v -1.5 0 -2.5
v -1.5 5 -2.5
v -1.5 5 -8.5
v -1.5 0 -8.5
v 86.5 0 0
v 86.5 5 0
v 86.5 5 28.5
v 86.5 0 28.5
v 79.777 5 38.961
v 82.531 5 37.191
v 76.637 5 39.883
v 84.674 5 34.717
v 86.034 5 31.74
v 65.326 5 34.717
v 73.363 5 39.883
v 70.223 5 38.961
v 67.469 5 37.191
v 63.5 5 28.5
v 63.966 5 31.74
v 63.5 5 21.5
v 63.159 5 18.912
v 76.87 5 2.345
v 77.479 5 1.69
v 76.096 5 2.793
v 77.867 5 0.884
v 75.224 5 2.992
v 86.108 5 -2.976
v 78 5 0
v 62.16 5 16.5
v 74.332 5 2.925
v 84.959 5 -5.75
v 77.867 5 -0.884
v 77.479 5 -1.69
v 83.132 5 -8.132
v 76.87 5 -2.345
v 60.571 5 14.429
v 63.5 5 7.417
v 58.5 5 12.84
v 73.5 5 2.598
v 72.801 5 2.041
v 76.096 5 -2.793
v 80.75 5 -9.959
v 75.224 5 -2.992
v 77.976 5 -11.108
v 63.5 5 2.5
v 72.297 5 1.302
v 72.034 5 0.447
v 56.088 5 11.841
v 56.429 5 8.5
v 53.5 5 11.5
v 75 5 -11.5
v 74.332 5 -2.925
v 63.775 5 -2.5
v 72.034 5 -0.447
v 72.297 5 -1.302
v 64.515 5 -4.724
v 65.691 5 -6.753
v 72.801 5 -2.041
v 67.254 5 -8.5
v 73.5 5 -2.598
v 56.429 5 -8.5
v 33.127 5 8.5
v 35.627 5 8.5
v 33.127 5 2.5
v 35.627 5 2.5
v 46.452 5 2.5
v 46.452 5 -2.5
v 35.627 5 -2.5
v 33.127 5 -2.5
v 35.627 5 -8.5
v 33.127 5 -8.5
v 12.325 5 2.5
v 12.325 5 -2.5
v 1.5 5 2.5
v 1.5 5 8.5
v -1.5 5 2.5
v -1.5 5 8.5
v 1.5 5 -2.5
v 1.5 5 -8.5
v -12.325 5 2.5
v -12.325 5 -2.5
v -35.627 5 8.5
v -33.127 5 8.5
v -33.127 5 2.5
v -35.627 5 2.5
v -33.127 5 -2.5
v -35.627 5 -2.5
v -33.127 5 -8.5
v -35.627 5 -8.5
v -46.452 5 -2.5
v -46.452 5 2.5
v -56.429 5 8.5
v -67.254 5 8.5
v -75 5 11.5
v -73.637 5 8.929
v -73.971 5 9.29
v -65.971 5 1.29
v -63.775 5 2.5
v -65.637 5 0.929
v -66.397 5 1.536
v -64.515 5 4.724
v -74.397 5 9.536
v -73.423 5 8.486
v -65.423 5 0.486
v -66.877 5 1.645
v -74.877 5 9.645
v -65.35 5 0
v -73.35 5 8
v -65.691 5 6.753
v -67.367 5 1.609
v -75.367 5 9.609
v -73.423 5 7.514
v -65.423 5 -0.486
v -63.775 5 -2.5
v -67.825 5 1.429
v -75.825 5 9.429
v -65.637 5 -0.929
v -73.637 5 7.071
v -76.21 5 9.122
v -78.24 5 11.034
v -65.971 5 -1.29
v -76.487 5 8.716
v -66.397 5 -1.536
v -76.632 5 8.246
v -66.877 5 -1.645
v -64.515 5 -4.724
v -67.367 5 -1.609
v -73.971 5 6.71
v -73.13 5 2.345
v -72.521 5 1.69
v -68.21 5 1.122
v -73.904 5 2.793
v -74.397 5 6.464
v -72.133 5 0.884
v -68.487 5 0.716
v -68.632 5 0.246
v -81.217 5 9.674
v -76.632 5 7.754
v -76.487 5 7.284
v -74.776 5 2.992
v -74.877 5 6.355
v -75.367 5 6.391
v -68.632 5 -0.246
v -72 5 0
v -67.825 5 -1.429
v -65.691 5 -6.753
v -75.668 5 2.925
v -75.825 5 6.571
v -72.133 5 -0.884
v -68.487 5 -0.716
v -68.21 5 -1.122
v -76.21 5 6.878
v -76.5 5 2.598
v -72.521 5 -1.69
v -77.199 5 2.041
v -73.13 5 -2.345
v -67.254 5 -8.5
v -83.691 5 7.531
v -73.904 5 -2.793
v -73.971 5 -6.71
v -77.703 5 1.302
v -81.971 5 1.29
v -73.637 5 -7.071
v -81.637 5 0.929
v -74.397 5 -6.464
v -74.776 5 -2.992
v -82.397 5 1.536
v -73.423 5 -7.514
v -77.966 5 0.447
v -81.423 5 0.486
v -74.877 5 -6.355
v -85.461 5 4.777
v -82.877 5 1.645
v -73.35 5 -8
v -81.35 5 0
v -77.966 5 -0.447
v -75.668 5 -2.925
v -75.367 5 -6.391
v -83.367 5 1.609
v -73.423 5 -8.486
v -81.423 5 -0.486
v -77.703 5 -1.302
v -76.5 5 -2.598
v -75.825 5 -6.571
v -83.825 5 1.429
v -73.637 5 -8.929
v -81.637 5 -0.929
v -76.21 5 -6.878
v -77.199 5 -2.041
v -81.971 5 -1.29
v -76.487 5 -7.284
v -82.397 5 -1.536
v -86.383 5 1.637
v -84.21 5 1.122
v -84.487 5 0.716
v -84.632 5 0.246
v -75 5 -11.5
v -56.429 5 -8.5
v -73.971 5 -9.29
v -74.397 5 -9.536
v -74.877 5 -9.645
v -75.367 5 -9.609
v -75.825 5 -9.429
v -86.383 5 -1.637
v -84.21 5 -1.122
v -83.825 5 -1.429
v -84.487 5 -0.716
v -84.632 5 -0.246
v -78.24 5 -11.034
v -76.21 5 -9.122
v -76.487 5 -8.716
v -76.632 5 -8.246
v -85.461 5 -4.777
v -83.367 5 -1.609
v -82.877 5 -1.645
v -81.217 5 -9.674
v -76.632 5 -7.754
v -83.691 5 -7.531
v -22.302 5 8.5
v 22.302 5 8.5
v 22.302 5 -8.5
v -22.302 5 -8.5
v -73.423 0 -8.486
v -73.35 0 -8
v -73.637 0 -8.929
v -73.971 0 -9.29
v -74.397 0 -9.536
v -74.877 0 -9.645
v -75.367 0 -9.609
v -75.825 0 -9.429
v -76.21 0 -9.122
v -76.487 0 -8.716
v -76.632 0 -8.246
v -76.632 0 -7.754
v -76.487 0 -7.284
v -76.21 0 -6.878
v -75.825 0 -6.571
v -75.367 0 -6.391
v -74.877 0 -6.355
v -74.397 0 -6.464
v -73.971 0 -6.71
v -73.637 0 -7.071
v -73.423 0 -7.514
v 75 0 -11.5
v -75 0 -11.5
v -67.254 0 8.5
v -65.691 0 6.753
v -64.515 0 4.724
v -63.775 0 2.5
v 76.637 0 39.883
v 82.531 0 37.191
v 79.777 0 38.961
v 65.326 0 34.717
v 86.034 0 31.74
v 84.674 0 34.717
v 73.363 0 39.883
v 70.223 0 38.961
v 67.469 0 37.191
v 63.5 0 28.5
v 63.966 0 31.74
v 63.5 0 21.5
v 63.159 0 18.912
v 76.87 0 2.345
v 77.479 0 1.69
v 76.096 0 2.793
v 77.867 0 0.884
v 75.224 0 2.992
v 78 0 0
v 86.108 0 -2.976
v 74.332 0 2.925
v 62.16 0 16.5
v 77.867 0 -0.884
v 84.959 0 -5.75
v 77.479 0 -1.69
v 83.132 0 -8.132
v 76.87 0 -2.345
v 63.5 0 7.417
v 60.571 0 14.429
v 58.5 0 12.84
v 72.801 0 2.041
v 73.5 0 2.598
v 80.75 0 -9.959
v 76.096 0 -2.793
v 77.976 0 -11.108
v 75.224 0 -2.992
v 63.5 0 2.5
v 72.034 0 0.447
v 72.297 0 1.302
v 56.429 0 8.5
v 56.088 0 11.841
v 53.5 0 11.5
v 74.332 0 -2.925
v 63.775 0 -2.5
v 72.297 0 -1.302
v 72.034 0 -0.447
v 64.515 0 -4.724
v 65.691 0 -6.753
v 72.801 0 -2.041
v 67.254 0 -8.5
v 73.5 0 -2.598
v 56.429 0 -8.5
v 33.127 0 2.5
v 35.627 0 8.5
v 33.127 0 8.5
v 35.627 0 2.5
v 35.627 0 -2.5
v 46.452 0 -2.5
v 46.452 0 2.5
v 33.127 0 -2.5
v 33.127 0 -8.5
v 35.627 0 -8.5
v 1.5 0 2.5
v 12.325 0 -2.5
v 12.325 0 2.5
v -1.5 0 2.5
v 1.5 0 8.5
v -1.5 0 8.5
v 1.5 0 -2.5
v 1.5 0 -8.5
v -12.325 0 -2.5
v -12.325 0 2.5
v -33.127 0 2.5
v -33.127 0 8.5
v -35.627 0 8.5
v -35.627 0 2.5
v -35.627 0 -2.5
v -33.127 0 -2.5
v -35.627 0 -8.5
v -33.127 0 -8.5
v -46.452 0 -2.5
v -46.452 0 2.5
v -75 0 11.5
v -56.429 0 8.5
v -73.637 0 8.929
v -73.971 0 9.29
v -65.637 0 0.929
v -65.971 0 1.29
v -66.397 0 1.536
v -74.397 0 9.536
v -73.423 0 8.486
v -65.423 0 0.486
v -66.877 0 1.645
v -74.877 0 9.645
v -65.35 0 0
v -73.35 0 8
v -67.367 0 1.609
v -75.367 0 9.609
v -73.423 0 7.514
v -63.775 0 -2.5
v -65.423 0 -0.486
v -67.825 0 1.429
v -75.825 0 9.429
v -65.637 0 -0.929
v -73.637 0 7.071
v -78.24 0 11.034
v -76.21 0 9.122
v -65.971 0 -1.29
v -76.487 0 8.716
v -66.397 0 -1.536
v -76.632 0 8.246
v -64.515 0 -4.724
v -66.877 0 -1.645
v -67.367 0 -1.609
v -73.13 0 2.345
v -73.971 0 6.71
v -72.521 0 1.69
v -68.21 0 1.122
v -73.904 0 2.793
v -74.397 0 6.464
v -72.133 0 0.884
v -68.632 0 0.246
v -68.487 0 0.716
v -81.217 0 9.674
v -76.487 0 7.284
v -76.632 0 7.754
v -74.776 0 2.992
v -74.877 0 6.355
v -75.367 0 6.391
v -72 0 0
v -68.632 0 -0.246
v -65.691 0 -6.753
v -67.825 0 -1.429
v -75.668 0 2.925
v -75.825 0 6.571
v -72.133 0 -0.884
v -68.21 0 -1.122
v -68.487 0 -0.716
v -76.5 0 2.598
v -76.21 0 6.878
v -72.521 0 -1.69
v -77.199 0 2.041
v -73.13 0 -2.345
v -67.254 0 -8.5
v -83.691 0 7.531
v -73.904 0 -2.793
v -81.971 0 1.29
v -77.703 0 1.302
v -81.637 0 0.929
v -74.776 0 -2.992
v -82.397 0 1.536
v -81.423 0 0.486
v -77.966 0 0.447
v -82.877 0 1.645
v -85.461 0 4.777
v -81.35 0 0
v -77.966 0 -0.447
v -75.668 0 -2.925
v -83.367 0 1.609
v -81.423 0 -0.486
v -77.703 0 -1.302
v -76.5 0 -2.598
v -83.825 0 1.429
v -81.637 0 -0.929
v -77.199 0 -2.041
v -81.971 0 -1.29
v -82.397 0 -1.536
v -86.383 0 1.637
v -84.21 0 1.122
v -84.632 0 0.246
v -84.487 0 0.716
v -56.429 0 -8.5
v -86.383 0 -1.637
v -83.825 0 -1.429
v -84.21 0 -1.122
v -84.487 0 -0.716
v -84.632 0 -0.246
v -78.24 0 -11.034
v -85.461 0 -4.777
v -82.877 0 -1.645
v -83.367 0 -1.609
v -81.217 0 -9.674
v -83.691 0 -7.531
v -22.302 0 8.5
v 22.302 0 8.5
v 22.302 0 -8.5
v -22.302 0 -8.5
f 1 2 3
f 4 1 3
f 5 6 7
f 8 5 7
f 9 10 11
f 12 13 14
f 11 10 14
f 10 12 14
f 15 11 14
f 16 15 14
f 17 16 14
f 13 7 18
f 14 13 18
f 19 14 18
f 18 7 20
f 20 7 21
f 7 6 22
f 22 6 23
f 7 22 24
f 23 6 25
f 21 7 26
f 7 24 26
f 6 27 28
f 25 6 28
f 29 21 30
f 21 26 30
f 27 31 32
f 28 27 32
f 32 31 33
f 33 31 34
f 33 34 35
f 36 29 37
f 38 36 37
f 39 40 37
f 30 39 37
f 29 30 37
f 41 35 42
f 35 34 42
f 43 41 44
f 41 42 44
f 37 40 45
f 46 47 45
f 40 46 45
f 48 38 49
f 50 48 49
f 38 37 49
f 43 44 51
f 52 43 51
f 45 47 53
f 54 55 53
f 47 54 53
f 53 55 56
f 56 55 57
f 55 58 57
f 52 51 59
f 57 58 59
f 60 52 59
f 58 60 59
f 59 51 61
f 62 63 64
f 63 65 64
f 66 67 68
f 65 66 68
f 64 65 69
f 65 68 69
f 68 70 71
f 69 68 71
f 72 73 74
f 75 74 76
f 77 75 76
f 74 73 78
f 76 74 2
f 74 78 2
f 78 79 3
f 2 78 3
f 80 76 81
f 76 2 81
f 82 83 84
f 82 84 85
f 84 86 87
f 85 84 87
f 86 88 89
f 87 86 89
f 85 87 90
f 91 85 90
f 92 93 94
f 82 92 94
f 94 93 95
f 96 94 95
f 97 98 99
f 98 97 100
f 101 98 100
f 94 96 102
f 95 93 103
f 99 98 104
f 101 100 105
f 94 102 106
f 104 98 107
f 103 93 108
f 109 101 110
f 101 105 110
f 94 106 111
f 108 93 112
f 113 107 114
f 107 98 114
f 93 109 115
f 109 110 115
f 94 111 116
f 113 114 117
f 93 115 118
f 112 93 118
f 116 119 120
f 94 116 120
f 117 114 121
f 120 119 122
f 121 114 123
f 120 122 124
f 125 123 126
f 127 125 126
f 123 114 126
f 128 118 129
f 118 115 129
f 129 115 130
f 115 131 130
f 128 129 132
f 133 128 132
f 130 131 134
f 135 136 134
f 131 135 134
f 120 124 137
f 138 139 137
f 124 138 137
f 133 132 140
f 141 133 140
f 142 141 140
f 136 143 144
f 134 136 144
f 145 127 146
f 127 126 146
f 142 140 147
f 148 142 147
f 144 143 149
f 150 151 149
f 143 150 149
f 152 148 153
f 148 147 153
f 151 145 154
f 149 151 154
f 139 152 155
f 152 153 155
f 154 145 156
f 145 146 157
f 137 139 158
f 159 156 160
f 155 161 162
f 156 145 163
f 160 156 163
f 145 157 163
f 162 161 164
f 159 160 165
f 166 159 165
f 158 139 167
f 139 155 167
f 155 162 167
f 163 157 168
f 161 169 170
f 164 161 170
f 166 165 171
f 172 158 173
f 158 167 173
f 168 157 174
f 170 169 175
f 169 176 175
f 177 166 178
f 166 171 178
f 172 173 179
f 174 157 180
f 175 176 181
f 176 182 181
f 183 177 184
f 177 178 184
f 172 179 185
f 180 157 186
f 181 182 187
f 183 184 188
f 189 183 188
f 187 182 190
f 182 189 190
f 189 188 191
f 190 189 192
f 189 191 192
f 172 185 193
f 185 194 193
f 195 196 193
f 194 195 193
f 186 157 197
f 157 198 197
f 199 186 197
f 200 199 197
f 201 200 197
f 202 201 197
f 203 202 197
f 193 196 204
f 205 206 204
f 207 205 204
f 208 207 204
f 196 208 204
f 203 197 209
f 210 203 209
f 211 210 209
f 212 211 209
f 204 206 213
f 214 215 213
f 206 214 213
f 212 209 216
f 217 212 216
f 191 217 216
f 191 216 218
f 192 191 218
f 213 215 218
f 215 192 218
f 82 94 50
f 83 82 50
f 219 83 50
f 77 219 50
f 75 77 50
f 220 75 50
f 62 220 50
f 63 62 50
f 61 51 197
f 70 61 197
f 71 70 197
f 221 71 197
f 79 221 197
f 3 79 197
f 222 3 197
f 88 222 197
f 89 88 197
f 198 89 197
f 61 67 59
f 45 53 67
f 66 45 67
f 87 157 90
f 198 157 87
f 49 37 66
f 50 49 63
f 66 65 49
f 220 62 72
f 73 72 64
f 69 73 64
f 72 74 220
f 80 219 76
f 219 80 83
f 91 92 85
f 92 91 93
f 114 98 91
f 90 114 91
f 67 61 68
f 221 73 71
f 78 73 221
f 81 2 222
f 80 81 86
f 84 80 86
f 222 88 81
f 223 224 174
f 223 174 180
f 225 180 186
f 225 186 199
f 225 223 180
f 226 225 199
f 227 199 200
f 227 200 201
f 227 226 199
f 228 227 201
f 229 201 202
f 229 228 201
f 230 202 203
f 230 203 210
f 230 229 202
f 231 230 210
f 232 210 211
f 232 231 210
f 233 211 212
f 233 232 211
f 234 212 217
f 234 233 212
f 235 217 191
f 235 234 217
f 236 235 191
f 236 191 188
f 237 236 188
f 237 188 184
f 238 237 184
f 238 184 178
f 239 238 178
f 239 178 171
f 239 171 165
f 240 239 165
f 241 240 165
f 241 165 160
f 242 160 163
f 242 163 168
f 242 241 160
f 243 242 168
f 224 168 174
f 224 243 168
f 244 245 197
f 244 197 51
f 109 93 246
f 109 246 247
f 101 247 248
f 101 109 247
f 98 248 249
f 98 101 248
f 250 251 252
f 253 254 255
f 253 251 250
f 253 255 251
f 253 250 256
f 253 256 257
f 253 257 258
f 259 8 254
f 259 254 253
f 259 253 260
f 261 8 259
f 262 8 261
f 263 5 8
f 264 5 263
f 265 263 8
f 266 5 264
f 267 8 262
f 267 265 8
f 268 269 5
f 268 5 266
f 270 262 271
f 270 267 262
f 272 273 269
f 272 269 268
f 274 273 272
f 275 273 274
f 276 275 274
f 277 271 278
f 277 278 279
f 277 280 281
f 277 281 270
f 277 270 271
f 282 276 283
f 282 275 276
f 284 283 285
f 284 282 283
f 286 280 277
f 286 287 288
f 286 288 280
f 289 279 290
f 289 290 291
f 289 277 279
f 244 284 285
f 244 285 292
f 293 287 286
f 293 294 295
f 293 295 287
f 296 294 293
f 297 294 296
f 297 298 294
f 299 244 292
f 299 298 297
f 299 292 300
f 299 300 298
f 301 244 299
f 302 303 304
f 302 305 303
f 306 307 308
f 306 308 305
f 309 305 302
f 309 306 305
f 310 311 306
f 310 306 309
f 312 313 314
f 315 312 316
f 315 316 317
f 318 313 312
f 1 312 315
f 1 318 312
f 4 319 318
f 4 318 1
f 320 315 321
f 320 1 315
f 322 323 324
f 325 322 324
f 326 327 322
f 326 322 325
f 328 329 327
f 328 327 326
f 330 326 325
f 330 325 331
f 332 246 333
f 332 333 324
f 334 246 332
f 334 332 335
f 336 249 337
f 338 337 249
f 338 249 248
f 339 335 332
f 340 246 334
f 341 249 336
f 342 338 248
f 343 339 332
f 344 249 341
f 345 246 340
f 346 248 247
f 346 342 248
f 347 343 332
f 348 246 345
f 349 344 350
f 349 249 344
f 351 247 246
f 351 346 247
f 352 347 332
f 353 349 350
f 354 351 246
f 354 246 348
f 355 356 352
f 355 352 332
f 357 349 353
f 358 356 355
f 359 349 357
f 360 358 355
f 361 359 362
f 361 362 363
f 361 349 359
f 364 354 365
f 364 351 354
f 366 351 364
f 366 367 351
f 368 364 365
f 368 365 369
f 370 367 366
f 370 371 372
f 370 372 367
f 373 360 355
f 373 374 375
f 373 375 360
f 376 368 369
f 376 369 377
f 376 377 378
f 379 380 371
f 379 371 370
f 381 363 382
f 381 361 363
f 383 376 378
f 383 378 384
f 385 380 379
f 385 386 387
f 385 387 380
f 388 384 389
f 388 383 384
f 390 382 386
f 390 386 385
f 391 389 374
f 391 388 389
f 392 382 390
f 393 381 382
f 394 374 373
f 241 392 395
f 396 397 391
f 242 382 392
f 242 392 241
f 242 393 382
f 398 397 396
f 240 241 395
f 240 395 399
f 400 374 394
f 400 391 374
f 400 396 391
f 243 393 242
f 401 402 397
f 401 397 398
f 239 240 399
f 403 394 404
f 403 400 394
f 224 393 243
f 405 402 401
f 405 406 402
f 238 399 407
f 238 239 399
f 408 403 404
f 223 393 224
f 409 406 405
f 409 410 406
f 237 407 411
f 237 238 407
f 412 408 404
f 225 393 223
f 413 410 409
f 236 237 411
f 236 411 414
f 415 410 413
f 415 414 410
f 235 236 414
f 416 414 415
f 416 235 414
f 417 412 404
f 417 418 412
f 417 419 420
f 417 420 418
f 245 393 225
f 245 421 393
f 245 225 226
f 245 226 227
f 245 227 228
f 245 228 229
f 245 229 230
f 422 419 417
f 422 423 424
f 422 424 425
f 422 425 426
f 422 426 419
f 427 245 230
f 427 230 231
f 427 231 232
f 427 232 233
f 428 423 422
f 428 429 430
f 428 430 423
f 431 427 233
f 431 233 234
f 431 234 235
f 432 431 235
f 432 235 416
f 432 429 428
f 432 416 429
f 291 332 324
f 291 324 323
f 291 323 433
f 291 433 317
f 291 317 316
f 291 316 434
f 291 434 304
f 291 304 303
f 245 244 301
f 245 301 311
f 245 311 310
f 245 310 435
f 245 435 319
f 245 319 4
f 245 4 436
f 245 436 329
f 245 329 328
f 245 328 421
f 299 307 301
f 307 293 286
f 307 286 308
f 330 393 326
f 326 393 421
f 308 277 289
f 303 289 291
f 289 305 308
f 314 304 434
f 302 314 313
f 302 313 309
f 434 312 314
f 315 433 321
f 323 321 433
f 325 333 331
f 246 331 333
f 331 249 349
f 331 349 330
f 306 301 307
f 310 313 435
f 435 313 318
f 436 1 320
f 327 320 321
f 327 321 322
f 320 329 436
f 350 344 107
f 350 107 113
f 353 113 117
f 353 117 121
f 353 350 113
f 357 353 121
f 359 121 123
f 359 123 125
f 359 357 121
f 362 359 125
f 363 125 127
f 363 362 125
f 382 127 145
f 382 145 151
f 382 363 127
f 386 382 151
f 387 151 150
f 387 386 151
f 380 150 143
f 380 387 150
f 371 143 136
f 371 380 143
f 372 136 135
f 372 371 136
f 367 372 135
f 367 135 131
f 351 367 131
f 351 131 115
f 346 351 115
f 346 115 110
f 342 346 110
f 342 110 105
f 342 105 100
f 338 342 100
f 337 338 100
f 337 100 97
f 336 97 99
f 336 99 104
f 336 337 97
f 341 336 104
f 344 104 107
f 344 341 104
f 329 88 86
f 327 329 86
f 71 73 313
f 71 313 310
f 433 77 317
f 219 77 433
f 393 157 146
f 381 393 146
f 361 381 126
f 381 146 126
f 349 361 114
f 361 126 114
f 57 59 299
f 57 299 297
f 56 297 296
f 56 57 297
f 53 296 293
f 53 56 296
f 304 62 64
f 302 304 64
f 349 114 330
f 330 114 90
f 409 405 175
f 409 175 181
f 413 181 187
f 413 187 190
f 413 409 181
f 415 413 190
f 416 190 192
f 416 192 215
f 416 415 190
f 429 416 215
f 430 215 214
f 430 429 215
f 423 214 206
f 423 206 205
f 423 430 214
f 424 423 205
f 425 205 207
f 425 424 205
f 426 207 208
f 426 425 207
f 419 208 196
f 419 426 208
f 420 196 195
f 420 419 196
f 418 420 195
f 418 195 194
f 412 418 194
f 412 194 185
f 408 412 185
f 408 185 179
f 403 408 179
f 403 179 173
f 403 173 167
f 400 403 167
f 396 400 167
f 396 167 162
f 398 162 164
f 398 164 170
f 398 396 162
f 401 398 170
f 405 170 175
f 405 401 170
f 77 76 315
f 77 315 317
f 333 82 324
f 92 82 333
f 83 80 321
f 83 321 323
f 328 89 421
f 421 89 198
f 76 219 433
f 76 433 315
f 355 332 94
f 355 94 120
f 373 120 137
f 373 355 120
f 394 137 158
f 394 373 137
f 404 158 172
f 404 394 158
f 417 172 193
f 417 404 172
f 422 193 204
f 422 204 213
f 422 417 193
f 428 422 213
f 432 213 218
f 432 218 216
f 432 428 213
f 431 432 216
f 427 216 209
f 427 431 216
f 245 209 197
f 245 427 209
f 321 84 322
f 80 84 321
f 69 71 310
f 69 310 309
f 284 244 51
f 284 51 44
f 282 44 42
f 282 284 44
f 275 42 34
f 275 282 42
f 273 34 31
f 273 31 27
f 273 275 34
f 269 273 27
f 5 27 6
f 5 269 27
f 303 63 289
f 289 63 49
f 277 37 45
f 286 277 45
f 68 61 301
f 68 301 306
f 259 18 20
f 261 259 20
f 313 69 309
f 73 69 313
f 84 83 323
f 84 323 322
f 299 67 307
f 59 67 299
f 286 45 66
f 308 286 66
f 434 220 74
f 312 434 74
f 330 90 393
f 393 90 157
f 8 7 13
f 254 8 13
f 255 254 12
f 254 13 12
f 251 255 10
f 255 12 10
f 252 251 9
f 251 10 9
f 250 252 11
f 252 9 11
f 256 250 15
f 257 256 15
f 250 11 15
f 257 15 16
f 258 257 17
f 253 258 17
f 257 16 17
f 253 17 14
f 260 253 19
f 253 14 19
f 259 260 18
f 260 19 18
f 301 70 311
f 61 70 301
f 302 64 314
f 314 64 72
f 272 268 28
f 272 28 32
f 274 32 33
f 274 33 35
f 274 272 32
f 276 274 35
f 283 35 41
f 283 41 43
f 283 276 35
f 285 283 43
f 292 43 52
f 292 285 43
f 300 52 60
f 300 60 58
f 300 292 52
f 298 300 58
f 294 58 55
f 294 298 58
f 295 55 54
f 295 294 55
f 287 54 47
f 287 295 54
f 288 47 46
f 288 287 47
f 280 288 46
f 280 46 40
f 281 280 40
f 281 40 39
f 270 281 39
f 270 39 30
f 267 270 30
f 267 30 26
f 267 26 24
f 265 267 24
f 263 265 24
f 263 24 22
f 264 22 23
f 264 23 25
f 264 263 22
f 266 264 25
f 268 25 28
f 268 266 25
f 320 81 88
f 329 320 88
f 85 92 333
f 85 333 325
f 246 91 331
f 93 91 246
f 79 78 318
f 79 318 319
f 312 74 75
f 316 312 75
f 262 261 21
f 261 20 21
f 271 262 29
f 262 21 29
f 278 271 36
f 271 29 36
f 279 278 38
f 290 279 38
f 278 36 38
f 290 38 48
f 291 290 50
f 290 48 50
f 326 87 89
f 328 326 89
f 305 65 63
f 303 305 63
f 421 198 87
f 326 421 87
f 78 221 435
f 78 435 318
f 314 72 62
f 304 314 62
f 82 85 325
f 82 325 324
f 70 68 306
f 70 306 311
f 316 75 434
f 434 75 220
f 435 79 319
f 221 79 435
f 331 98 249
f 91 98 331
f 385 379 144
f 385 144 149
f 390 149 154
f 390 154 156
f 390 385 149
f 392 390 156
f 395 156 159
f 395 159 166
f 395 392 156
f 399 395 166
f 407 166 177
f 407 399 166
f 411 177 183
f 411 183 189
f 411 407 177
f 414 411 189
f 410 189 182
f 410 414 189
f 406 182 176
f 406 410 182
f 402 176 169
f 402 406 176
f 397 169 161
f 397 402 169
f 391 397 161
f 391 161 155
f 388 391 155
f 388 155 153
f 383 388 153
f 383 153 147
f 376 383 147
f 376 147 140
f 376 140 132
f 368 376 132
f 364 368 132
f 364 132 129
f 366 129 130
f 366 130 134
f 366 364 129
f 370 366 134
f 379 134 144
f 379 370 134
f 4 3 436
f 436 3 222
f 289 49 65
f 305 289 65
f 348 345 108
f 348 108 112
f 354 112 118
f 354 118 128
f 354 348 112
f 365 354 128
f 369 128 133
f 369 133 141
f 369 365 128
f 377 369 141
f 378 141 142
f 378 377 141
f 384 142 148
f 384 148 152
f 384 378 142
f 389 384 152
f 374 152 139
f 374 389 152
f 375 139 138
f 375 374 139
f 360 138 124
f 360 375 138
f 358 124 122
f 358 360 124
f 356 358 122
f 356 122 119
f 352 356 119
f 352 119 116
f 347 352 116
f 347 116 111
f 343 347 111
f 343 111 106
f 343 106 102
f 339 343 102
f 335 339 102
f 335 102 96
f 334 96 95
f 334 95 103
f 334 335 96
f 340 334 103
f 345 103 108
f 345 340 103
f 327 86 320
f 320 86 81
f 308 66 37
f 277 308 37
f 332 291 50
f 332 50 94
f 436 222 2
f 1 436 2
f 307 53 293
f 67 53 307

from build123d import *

# Parameters (mm, degrees)
SKETCH1_R           = 1.65
SKETCH1_R_2         = 3
BOSS_EXTRUDE1_DEPTH = 5
CUT_EXTRUDE1_DEPTH  = 5
SKETCH3_R           = 3
BOSS_EXTRUDE2_DEPTH = 5
FILLET1_R           = 10


with BuildPart() as part:
    # Sketch1 → Boss-Extrude1 (new body)
    with BuildSketch(Plane(origin=(0, 0, 0), x_dir=(1, 0, 0), z_dir=(0, 1, 0))):
        with BuildLine():
            Line((-75, 11.5), (75, 11.5))
            ThreePointArc((75, 11.5), (86.5, 0), (75, -11.5))
            Line((75, -11.5), (-75, -11.5))
            ThreePointArc((-75, -11.5), (-86.5, 0), (-75, 11.5))
        make_face()
        with Locations((-75, 8)):
            Circle(SKETCH1_R, mode=Mode.SUBTRACT)
        with Locations((-67, 0)):
            Circle(SKETCH1_R, mode=Mode.SUBTRACT)
        with Locations((-75, -8)):
            Circle(SKETCH1_R, mode=Mode.SUBTRACT)
        with Locations((-83, 0)):
            Circle(SKETCH1_R, mode=Mode.SUBTRACT)
        with Locations((75, 0)):
            Circle(SKETCH1_R_2, mode=Mode.SUBTRACT)
        with Locations((-75, 0)):
            Circle(SKETCH1_R_2, mode=Mode.SUBTRACT)
    extrude(amount=BOSS_EXTRUDE1_DEPTH)

    # Sketch2 → Cut-Extrude1 (cut)
    with BuildSketch(Plane(origin=(0, 5, 0), x_dir=(1, 0, 0), z_dir=(0, 1, 0))):
        with BuildLine():
            Line((-63.77502784, 2.5), (-46.452027549, 2.5))
            Line((-46.452027549, 2.5), (-67.254033308, 8.5))
            ThreePointArc((-67.254033308, 8.5), (-65.051425718, 5.768524054), (-63.77502784, 2.5))
        make_face()
        Polygon((-56.429022412, 8.5), (-35.627016654, 2.5), (-35.627016654, 8.5), align=None)
        Polygon((-12.325010896, 2.5), (-33.127016654, 8.5), (-33.127016654, 2.5), align=None)
        Polygon((-1.5, 8.5), (-22.302005758, 8.5), (-1.5, 2.5), align=None)
        Polygon((-1.5, -2.5), (-1.5, -8.5), (-22.302005758, -8.5), align=None)
        Polygon((-33.127016654, -2.5), (-12.325010896, -2.5), (-33.127016654, -8.5), align=None)
        Polygon((-35.627016654, -2.5), (-35.627016654, -8.5), (-56.429022412, -8.5), align=None)
        with BuildLine():
            Line((-46.452027549, -2.5), (-67.254033308, -8.5))
            ThreePointArc((-67.254033308, -8.5), (-65.051425718, -5.768524054), (-63.77502784, -2.5))
            Line((-63.77502784, -2.5), (-46.452027549, -2.5))
        make_face()
        Polygon((22.302005758, -8.5), (1.5, -2.5), (1.5, -8.5), align=None)
        Polygon((33.127016654, -8.5), (33.127016654, -2.5), (12.325010896, -2.5), align=None)
        Polygon((56.429022412, -8.5), (35.627016654, -2.5), (35.627016654, -8.5), align=None)
        with BuildLine():
            Line((46.452027549, -2.5), (67.254033308, -8.5))
            ThreePointArc((67.254033308, -8.5), (65.051425718, -5.768524054), (63.77502784, -2.5))
            Line((63.77502784, -2.5), (46.452027549, -2.5))
        make_face()
        with BuildLine():
            Line((46.452027549, 2.5), (67.254033308, 8.5))
            ThreePointArc((67.254033308, 8.5), (65.051425718, 5.768524054), (63.77502784, 2.5))
            Line((63.77502784, 2.5), (46.452027549, 2.5))
        make_face()
        Polygon((35.627016654, 2.5), (35.627016654, 8.5), (56.429022412, 8.5), align=None)
        Polygon((33.127016654, 2.5), (12.325010896, 2.5), (33.127016654, 8.5), align=None)
        Polygon((1.5, 2.5), (1.5, 8.5), (22.302005758, 8.5), align=None)
    extrude(amount=-CUT_EXTRUDE1_DEPTH, mode=Mode.SUBTRACT)

    # Sketch3 → Boss-Extrude2 (add, through all)
    with BuildSketch(Plane(origin=(0, 5, 0), x_dir=(1, 0, 0), z_dir=(0, 1, 0))):
        with BuildLine():
            Line((86.5, 0), (86.5, -28.5))
            ThreePointArc((86.5, -28.5), (75, -40), (63.5, -28.5))
            Line((63.5, -28.5), (63.5, 0))
            ThreePointArc((63.5, 0), (75, 11.5), (86.5, 0))
        make_face()
        with Locations((75, 0)):
            Circle(SKETCH3_R, mode=Mode.SUBTRACT)
    extrude(amount=-BOSS_EXTRUDE2_DEPTH)

    # Fillet1
    fillet1_edges = [part.edges().sort_by_distance(p)[0] for p in [
        (63.5, 2.5, 11.5),
    ]]
    fillet(fillet1_edges, radius=FILLET1_R)


solid = part.part
